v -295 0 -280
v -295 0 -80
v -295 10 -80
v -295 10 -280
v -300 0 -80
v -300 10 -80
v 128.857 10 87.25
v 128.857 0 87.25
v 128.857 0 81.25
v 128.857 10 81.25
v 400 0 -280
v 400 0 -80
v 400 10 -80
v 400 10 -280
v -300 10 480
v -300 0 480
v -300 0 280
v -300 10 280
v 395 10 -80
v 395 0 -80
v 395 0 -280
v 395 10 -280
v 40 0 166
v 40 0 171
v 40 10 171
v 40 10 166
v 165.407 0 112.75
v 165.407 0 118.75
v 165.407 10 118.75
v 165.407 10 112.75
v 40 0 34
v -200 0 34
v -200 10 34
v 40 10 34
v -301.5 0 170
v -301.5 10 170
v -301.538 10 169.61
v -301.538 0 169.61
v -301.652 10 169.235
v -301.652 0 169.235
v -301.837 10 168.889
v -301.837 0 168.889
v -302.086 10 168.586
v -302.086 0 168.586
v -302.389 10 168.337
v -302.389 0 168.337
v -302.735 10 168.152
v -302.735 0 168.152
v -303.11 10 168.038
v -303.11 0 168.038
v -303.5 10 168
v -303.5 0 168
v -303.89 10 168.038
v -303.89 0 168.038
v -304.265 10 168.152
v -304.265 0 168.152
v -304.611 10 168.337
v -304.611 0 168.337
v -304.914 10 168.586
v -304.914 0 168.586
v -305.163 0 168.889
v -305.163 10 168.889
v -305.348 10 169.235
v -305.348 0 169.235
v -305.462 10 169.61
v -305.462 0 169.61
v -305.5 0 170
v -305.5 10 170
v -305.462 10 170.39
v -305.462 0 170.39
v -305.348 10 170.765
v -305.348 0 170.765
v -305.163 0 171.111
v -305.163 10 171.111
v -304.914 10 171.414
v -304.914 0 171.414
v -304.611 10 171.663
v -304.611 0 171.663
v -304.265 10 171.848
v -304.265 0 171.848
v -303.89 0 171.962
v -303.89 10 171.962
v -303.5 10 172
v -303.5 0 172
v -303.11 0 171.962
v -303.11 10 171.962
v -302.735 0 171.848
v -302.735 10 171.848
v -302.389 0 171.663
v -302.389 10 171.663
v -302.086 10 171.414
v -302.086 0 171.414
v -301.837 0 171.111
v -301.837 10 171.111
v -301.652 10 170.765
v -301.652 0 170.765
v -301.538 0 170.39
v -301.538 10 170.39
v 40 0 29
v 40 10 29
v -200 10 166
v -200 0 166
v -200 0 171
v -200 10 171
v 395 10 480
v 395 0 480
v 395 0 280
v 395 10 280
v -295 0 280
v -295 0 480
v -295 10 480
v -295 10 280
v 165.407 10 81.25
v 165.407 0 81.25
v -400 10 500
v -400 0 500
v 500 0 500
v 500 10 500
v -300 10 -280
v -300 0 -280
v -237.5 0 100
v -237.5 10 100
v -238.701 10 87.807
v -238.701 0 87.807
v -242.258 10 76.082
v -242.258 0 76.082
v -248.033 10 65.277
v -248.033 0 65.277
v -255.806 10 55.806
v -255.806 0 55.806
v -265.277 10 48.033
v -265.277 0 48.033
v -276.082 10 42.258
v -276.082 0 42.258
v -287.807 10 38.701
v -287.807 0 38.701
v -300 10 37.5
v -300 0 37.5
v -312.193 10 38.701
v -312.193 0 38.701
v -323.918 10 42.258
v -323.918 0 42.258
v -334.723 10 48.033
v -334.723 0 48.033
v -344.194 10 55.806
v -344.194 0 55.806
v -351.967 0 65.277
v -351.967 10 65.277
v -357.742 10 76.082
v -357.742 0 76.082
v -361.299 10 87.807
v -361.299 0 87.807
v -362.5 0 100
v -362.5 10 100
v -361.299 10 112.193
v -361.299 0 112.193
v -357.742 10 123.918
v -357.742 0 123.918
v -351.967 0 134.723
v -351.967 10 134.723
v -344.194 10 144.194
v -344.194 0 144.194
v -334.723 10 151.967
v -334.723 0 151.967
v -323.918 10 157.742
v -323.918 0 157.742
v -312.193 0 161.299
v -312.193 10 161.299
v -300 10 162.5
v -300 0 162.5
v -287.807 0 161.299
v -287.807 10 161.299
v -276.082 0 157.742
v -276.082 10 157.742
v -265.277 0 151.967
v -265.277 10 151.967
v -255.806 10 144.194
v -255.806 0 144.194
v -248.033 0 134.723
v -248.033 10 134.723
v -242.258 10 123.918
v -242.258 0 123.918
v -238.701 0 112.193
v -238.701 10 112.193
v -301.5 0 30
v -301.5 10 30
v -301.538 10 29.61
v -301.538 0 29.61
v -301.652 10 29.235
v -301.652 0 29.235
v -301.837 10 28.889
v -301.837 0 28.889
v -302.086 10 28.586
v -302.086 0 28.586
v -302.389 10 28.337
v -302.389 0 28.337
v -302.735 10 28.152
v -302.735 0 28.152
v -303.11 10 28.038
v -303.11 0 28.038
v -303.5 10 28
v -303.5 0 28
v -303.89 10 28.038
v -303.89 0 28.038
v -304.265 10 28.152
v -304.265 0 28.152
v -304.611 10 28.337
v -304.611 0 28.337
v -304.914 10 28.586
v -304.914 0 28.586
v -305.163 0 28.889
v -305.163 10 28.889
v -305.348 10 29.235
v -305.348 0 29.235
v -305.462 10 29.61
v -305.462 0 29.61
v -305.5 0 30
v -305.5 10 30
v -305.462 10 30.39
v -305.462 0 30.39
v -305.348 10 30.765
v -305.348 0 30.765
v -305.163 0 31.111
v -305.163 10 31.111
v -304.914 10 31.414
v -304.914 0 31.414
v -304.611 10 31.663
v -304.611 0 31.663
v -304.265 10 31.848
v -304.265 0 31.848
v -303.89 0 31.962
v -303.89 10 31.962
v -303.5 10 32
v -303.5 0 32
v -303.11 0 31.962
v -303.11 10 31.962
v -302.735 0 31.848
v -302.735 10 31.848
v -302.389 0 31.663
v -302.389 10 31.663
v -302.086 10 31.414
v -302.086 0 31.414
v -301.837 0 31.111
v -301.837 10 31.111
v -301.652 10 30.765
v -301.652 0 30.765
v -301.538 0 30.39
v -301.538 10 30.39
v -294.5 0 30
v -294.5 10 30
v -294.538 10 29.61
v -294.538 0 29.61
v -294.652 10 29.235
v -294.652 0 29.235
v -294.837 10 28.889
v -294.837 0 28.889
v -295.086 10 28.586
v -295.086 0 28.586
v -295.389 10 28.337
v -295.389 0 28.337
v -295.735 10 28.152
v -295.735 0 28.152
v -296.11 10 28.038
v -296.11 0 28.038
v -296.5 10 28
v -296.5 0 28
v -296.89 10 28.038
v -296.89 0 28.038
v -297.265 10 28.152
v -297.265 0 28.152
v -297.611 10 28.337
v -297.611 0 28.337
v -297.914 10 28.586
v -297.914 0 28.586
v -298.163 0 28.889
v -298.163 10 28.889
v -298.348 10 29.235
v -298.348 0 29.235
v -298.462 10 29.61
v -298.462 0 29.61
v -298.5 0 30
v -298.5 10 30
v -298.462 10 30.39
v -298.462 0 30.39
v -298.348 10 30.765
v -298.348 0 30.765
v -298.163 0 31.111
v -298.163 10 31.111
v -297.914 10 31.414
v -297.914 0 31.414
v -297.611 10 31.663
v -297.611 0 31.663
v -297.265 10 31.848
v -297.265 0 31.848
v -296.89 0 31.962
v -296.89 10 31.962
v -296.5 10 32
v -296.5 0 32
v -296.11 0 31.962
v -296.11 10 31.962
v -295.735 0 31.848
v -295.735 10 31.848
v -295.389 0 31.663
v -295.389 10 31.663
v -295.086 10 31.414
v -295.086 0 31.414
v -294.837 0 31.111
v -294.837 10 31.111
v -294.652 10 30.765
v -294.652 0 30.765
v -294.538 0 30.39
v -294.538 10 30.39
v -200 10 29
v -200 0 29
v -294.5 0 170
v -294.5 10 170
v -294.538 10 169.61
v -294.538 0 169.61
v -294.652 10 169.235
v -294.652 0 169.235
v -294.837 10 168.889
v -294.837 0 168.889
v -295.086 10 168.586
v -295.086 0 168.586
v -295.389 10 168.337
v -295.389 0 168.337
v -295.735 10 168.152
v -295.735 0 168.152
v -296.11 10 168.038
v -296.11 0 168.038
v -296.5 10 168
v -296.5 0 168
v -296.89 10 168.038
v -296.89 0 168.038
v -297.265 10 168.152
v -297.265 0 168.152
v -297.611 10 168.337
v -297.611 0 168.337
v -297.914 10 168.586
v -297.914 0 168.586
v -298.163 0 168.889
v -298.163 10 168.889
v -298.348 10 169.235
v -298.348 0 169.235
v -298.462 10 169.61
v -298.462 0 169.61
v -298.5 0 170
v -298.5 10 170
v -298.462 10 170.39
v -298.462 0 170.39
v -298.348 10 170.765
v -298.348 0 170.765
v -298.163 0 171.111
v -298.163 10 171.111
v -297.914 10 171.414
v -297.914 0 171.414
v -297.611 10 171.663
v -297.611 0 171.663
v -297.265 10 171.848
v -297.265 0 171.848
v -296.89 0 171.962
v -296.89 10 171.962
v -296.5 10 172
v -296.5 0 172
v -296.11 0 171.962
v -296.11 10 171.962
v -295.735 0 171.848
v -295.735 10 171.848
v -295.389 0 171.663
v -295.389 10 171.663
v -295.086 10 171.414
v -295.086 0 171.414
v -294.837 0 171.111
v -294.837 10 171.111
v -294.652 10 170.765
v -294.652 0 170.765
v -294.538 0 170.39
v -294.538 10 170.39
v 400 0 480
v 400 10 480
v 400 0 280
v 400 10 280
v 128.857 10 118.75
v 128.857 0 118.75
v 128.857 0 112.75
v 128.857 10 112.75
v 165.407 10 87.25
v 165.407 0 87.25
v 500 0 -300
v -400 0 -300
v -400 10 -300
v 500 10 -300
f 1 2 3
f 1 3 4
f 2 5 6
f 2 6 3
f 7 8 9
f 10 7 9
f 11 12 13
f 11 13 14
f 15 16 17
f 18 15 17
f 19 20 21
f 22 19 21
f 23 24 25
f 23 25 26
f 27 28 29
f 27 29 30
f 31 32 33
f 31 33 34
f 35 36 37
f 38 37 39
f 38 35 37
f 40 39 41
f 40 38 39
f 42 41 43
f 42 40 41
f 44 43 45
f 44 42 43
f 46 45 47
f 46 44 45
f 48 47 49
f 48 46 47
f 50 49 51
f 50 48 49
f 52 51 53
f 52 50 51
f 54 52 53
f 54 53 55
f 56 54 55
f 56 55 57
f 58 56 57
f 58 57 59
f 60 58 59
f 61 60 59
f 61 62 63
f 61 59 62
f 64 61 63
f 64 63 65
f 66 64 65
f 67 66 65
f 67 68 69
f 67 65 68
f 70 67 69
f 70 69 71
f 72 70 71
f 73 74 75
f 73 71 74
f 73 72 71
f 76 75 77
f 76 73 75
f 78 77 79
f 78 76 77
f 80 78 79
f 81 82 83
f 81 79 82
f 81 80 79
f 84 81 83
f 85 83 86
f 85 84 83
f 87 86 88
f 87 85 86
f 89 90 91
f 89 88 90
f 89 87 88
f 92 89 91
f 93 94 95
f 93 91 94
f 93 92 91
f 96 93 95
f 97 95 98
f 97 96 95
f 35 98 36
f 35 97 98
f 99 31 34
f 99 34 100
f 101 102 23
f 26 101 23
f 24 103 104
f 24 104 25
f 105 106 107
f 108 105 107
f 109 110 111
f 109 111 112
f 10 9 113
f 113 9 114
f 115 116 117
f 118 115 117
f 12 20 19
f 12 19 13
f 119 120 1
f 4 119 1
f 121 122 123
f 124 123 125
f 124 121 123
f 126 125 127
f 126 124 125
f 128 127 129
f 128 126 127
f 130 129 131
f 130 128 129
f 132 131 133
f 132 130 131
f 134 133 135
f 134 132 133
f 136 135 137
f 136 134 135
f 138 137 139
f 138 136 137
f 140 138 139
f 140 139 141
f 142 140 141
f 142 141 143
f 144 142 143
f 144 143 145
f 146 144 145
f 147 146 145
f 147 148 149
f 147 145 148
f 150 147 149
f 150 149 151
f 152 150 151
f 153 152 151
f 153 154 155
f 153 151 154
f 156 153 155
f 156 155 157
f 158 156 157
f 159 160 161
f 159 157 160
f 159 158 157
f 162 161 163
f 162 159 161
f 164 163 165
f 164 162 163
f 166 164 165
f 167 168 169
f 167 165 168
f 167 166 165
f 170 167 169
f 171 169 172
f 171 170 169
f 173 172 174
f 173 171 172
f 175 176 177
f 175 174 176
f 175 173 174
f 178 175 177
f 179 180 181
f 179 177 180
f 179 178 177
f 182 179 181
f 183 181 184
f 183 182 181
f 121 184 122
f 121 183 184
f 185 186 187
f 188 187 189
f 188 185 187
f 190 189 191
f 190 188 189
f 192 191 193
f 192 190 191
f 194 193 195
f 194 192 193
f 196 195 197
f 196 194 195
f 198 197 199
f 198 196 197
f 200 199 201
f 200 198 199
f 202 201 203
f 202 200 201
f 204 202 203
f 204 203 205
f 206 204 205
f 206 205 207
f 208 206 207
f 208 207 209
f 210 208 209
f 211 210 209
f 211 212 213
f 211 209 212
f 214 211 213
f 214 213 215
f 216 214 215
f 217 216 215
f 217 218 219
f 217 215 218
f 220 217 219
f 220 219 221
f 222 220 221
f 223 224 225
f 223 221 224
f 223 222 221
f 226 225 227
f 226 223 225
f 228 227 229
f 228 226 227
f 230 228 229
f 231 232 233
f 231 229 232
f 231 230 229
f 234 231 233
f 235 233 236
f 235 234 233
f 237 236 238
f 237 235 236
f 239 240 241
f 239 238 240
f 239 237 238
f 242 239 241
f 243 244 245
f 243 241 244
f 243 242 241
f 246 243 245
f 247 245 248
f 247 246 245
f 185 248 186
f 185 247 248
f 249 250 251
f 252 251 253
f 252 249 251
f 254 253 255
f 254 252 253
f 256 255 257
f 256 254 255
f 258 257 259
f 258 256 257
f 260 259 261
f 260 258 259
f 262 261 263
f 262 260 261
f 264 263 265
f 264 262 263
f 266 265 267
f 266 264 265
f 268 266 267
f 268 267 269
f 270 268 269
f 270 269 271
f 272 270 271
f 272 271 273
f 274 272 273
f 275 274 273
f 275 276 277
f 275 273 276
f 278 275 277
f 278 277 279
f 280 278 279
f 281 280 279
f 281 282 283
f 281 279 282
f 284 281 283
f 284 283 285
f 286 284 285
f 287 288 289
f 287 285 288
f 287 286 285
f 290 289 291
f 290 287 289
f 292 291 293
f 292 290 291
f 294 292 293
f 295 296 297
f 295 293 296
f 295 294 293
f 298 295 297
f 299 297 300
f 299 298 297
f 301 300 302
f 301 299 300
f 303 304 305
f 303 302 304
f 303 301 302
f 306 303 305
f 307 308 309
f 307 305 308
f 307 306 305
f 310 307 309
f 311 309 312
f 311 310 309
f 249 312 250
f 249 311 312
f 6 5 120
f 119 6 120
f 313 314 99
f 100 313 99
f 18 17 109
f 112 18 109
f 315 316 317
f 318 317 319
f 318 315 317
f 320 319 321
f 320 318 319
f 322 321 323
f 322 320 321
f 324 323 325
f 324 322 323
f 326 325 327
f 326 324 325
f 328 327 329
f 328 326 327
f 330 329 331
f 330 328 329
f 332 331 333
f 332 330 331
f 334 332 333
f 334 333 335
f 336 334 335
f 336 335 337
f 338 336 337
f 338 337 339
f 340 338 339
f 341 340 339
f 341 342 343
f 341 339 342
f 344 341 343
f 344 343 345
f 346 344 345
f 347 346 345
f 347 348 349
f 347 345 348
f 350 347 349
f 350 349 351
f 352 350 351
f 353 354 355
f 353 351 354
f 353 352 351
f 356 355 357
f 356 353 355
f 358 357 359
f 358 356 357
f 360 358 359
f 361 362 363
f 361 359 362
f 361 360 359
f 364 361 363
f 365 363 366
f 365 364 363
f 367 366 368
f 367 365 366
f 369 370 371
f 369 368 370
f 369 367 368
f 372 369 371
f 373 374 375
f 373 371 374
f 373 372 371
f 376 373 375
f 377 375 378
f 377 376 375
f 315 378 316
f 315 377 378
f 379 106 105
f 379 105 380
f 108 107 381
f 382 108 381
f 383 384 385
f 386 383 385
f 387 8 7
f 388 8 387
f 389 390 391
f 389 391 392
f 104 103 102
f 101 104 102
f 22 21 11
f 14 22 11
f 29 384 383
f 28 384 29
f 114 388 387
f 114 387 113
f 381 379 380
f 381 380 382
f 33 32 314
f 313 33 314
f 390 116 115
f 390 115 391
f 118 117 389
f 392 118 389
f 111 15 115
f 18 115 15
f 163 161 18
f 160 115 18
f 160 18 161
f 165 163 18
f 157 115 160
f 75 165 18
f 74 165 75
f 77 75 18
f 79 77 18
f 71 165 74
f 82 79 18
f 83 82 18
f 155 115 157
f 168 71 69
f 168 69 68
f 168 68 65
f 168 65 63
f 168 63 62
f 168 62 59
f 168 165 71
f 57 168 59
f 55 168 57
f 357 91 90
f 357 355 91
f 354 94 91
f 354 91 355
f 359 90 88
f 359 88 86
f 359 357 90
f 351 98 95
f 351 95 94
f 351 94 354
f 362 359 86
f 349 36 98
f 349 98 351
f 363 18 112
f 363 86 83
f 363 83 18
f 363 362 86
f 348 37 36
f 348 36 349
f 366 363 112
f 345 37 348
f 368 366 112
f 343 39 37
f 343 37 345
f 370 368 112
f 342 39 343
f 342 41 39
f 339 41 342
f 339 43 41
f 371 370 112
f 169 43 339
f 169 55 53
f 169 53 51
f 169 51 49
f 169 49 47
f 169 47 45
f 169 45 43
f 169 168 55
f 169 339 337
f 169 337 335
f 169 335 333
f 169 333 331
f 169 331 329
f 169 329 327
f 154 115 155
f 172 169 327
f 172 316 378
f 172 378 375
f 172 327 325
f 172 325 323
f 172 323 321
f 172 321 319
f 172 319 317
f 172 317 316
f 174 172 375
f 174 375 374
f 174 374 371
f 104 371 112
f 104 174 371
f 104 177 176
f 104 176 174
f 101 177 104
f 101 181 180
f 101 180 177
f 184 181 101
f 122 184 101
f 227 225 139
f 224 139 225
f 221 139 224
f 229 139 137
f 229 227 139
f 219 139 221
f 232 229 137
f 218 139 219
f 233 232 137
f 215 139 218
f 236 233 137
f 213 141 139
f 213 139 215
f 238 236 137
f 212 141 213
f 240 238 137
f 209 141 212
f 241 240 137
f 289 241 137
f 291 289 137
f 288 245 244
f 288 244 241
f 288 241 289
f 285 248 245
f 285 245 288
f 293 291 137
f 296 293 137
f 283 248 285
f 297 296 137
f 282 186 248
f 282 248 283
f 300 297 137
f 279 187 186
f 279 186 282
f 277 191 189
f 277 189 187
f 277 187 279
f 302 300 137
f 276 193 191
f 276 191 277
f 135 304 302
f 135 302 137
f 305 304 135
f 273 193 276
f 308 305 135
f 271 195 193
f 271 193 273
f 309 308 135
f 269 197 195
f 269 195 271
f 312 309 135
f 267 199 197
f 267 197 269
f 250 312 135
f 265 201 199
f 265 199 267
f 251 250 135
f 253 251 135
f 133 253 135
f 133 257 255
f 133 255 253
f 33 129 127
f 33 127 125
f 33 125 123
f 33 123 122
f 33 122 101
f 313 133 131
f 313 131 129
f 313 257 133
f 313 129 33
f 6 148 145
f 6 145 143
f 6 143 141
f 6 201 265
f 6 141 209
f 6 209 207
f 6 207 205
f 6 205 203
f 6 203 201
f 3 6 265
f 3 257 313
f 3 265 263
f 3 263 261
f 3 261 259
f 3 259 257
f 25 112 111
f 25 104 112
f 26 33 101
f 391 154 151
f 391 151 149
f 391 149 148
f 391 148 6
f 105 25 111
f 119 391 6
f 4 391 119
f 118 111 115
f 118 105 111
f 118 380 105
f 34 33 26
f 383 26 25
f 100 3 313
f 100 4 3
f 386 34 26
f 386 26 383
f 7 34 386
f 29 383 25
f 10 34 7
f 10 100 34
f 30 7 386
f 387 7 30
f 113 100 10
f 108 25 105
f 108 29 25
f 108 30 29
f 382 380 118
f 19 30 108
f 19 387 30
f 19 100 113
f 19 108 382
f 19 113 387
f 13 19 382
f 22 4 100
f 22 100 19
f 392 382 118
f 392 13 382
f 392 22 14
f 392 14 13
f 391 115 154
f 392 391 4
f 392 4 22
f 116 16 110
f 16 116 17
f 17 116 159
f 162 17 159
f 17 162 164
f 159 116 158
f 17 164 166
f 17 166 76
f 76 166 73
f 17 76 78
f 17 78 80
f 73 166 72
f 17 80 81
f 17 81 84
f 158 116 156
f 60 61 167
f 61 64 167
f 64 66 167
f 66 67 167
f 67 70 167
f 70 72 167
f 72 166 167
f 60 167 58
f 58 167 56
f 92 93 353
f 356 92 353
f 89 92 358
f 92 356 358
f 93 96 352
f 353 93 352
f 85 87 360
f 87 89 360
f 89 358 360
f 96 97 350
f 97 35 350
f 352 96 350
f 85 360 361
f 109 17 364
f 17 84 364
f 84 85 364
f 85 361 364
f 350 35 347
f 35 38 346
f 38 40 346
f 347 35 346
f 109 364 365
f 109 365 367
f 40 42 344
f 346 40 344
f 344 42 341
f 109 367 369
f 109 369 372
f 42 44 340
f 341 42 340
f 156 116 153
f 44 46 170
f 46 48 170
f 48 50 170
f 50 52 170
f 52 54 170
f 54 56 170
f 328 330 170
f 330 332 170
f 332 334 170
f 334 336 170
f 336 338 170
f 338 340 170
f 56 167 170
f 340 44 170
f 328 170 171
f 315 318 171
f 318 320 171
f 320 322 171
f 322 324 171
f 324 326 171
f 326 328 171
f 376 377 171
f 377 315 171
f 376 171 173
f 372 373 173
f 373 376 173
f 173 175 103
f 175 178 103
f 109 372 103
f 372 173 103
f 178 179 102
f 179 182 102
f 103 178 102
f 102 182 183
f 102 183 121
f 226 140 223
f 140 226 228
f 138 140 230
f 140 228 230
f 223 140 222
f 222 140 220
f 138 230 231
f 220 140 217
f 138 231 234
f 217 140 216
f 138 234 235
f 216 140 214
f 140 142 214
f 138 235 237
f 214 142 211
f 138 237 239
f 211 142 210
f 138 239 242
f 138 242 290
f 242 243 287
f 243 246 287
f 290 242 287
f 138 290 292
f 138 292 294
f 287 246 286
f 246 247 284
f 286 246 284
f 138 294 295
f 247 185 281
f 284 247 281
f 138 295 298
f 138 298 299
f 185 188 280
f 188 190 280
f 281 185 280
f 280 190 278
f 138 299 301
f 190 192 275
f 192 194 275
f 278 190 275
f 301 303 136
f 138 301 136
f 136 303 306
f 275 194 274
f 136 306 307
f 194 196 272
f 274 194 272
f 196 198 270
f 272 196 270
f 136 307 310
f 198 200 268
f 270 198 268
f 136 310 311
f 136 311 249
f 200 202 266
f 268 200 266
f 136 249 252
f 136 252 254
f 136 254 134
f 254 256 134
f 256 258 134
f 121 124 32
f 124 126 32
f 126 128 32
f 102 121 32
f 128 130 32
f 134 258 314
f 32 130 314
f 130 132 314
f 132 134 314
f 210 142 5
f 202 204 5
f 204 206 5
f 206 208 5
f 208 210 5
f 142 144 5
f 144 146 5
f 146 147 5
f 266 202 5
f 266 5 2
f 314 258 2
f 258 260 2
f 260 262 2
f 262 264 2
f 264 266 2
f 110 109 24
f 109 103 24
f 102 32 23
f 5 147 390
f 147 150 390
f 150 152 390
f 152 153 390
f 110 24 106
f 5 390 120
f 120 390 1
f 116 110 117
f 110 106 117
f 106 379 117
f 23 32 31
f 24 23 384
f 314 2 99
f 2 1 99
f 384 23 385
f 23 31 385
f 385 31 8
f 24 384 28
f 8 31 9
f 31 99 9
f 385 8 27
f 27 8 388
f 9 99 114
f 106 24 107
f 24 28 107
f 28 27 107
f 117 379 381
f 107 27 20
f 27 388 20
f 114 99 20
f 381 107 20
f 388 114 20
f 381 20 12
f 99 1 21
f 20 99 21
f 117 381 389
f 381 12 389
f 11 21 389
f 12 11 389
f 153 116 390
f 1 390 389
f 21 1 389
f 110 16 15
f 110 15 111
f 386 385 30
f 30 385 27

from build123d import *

# Parameters (mm, degrees)
SKETCH1_W           = 900
SKETCH1_H           = 800
SKETCH1_W_2         = 5
SKETCH1_H_2         = 200
BOSS_EXTRUDE1_DEPTH = 10
SKETCH2_R           = 62.5
CUT_EXTRUDE4_DEPTH  = 196
SKETCH3_R           = 2
SKETCH3_W           = 36.55
SKETCH3_H           = 6
SKETCH3_W_2         = 240
SKETCH3_H_2         = 5
CUT_EXTRUDE5_DEPTH  = 11


with BuildPart() as part:
    # Sketch1 → Boss-Extrude1 (new body)
    with BuildSketch(Plane(origin=(0, 0, 0), x_dir=(1, 0, 0), z_dir=(0, 1, 0))):
        with Locations((50, -100)):
            Rectangle(SKETCH1_W, SKETCH1_H)
        with Locations((397.5, 180)):
            Rectangle(SKETCH1_W_2, SKETCH1_H_2, mode=Mode.SUBTRACT)
        with Locations((-297.5, 180)):
            Rectangle(SKETCH1_W_2, SKETCH1_H_2, mode=Mode.SUBTRACT)
        with Locations((-297.5, -380)):
            Rectangle(SKETCH1_W_2, SKETCH1_H_2, mode=Mode.SUBTRACT)
        with Locations((397.5, -380)):
            Rectangle(SKETCH1_W_2, SKETCH1_H_2, mode=Mode.SUBTRACT)
    extrude(amount=BOSS_EXTRUDE1_DEPTH)

    # Sketch2 → Cut-Extrude4 (cut)
    with BuildSketch(Plane(origin=(0, 0, 0), x_dir=(1, 0, 0), z_dir=(0, 1, 0))):
        with Locations((-300, -100)):
            Circle(SKETCH2_R)
    extrude(amount=CUT_EXTRUDE4_DEPTH, mode=Mode.SUBTRACT)

    # Sketch3 → Cut-Extrude5 (cut, through all)
    with BuildSketch(Plane(origin=(0, 0, 0), x_dir=(1, 0, 0), z_dir=(0, 1, 0))):
        with Locations((-296.5, -30)):
            Circle(SKETCH3_R)
        with Locations((-303.5, -30)):
            Circle(SKETCH3_R)
        with Locations((-303.5, -170)):
            Circle(SKETCH3_R)
        with Locations((-296.5, -170)):
            Circle(SKETCH3_R)
        with Locations((147.13212951, -115.75)):
            Rectangle(SKETCH3_W, SKETCH3_H)
        with Locations((147.13212951, -84.25)):
            Rectangle(SKETCH3_W, SKETCH3_H)
        with Locations((-80, -168.5)):
            Rectangle(SKETCH3_W_2, SKETCH3_H_2)
        with Locations((-80, -31.5)):
            Rectangle(SKETCH3_W_2, SKETCH3_H_2)
    extrude(amount=CUT_EXTRUDE5_DEPTH, mode=Mode.SUBTRACT)


solid = part.part
